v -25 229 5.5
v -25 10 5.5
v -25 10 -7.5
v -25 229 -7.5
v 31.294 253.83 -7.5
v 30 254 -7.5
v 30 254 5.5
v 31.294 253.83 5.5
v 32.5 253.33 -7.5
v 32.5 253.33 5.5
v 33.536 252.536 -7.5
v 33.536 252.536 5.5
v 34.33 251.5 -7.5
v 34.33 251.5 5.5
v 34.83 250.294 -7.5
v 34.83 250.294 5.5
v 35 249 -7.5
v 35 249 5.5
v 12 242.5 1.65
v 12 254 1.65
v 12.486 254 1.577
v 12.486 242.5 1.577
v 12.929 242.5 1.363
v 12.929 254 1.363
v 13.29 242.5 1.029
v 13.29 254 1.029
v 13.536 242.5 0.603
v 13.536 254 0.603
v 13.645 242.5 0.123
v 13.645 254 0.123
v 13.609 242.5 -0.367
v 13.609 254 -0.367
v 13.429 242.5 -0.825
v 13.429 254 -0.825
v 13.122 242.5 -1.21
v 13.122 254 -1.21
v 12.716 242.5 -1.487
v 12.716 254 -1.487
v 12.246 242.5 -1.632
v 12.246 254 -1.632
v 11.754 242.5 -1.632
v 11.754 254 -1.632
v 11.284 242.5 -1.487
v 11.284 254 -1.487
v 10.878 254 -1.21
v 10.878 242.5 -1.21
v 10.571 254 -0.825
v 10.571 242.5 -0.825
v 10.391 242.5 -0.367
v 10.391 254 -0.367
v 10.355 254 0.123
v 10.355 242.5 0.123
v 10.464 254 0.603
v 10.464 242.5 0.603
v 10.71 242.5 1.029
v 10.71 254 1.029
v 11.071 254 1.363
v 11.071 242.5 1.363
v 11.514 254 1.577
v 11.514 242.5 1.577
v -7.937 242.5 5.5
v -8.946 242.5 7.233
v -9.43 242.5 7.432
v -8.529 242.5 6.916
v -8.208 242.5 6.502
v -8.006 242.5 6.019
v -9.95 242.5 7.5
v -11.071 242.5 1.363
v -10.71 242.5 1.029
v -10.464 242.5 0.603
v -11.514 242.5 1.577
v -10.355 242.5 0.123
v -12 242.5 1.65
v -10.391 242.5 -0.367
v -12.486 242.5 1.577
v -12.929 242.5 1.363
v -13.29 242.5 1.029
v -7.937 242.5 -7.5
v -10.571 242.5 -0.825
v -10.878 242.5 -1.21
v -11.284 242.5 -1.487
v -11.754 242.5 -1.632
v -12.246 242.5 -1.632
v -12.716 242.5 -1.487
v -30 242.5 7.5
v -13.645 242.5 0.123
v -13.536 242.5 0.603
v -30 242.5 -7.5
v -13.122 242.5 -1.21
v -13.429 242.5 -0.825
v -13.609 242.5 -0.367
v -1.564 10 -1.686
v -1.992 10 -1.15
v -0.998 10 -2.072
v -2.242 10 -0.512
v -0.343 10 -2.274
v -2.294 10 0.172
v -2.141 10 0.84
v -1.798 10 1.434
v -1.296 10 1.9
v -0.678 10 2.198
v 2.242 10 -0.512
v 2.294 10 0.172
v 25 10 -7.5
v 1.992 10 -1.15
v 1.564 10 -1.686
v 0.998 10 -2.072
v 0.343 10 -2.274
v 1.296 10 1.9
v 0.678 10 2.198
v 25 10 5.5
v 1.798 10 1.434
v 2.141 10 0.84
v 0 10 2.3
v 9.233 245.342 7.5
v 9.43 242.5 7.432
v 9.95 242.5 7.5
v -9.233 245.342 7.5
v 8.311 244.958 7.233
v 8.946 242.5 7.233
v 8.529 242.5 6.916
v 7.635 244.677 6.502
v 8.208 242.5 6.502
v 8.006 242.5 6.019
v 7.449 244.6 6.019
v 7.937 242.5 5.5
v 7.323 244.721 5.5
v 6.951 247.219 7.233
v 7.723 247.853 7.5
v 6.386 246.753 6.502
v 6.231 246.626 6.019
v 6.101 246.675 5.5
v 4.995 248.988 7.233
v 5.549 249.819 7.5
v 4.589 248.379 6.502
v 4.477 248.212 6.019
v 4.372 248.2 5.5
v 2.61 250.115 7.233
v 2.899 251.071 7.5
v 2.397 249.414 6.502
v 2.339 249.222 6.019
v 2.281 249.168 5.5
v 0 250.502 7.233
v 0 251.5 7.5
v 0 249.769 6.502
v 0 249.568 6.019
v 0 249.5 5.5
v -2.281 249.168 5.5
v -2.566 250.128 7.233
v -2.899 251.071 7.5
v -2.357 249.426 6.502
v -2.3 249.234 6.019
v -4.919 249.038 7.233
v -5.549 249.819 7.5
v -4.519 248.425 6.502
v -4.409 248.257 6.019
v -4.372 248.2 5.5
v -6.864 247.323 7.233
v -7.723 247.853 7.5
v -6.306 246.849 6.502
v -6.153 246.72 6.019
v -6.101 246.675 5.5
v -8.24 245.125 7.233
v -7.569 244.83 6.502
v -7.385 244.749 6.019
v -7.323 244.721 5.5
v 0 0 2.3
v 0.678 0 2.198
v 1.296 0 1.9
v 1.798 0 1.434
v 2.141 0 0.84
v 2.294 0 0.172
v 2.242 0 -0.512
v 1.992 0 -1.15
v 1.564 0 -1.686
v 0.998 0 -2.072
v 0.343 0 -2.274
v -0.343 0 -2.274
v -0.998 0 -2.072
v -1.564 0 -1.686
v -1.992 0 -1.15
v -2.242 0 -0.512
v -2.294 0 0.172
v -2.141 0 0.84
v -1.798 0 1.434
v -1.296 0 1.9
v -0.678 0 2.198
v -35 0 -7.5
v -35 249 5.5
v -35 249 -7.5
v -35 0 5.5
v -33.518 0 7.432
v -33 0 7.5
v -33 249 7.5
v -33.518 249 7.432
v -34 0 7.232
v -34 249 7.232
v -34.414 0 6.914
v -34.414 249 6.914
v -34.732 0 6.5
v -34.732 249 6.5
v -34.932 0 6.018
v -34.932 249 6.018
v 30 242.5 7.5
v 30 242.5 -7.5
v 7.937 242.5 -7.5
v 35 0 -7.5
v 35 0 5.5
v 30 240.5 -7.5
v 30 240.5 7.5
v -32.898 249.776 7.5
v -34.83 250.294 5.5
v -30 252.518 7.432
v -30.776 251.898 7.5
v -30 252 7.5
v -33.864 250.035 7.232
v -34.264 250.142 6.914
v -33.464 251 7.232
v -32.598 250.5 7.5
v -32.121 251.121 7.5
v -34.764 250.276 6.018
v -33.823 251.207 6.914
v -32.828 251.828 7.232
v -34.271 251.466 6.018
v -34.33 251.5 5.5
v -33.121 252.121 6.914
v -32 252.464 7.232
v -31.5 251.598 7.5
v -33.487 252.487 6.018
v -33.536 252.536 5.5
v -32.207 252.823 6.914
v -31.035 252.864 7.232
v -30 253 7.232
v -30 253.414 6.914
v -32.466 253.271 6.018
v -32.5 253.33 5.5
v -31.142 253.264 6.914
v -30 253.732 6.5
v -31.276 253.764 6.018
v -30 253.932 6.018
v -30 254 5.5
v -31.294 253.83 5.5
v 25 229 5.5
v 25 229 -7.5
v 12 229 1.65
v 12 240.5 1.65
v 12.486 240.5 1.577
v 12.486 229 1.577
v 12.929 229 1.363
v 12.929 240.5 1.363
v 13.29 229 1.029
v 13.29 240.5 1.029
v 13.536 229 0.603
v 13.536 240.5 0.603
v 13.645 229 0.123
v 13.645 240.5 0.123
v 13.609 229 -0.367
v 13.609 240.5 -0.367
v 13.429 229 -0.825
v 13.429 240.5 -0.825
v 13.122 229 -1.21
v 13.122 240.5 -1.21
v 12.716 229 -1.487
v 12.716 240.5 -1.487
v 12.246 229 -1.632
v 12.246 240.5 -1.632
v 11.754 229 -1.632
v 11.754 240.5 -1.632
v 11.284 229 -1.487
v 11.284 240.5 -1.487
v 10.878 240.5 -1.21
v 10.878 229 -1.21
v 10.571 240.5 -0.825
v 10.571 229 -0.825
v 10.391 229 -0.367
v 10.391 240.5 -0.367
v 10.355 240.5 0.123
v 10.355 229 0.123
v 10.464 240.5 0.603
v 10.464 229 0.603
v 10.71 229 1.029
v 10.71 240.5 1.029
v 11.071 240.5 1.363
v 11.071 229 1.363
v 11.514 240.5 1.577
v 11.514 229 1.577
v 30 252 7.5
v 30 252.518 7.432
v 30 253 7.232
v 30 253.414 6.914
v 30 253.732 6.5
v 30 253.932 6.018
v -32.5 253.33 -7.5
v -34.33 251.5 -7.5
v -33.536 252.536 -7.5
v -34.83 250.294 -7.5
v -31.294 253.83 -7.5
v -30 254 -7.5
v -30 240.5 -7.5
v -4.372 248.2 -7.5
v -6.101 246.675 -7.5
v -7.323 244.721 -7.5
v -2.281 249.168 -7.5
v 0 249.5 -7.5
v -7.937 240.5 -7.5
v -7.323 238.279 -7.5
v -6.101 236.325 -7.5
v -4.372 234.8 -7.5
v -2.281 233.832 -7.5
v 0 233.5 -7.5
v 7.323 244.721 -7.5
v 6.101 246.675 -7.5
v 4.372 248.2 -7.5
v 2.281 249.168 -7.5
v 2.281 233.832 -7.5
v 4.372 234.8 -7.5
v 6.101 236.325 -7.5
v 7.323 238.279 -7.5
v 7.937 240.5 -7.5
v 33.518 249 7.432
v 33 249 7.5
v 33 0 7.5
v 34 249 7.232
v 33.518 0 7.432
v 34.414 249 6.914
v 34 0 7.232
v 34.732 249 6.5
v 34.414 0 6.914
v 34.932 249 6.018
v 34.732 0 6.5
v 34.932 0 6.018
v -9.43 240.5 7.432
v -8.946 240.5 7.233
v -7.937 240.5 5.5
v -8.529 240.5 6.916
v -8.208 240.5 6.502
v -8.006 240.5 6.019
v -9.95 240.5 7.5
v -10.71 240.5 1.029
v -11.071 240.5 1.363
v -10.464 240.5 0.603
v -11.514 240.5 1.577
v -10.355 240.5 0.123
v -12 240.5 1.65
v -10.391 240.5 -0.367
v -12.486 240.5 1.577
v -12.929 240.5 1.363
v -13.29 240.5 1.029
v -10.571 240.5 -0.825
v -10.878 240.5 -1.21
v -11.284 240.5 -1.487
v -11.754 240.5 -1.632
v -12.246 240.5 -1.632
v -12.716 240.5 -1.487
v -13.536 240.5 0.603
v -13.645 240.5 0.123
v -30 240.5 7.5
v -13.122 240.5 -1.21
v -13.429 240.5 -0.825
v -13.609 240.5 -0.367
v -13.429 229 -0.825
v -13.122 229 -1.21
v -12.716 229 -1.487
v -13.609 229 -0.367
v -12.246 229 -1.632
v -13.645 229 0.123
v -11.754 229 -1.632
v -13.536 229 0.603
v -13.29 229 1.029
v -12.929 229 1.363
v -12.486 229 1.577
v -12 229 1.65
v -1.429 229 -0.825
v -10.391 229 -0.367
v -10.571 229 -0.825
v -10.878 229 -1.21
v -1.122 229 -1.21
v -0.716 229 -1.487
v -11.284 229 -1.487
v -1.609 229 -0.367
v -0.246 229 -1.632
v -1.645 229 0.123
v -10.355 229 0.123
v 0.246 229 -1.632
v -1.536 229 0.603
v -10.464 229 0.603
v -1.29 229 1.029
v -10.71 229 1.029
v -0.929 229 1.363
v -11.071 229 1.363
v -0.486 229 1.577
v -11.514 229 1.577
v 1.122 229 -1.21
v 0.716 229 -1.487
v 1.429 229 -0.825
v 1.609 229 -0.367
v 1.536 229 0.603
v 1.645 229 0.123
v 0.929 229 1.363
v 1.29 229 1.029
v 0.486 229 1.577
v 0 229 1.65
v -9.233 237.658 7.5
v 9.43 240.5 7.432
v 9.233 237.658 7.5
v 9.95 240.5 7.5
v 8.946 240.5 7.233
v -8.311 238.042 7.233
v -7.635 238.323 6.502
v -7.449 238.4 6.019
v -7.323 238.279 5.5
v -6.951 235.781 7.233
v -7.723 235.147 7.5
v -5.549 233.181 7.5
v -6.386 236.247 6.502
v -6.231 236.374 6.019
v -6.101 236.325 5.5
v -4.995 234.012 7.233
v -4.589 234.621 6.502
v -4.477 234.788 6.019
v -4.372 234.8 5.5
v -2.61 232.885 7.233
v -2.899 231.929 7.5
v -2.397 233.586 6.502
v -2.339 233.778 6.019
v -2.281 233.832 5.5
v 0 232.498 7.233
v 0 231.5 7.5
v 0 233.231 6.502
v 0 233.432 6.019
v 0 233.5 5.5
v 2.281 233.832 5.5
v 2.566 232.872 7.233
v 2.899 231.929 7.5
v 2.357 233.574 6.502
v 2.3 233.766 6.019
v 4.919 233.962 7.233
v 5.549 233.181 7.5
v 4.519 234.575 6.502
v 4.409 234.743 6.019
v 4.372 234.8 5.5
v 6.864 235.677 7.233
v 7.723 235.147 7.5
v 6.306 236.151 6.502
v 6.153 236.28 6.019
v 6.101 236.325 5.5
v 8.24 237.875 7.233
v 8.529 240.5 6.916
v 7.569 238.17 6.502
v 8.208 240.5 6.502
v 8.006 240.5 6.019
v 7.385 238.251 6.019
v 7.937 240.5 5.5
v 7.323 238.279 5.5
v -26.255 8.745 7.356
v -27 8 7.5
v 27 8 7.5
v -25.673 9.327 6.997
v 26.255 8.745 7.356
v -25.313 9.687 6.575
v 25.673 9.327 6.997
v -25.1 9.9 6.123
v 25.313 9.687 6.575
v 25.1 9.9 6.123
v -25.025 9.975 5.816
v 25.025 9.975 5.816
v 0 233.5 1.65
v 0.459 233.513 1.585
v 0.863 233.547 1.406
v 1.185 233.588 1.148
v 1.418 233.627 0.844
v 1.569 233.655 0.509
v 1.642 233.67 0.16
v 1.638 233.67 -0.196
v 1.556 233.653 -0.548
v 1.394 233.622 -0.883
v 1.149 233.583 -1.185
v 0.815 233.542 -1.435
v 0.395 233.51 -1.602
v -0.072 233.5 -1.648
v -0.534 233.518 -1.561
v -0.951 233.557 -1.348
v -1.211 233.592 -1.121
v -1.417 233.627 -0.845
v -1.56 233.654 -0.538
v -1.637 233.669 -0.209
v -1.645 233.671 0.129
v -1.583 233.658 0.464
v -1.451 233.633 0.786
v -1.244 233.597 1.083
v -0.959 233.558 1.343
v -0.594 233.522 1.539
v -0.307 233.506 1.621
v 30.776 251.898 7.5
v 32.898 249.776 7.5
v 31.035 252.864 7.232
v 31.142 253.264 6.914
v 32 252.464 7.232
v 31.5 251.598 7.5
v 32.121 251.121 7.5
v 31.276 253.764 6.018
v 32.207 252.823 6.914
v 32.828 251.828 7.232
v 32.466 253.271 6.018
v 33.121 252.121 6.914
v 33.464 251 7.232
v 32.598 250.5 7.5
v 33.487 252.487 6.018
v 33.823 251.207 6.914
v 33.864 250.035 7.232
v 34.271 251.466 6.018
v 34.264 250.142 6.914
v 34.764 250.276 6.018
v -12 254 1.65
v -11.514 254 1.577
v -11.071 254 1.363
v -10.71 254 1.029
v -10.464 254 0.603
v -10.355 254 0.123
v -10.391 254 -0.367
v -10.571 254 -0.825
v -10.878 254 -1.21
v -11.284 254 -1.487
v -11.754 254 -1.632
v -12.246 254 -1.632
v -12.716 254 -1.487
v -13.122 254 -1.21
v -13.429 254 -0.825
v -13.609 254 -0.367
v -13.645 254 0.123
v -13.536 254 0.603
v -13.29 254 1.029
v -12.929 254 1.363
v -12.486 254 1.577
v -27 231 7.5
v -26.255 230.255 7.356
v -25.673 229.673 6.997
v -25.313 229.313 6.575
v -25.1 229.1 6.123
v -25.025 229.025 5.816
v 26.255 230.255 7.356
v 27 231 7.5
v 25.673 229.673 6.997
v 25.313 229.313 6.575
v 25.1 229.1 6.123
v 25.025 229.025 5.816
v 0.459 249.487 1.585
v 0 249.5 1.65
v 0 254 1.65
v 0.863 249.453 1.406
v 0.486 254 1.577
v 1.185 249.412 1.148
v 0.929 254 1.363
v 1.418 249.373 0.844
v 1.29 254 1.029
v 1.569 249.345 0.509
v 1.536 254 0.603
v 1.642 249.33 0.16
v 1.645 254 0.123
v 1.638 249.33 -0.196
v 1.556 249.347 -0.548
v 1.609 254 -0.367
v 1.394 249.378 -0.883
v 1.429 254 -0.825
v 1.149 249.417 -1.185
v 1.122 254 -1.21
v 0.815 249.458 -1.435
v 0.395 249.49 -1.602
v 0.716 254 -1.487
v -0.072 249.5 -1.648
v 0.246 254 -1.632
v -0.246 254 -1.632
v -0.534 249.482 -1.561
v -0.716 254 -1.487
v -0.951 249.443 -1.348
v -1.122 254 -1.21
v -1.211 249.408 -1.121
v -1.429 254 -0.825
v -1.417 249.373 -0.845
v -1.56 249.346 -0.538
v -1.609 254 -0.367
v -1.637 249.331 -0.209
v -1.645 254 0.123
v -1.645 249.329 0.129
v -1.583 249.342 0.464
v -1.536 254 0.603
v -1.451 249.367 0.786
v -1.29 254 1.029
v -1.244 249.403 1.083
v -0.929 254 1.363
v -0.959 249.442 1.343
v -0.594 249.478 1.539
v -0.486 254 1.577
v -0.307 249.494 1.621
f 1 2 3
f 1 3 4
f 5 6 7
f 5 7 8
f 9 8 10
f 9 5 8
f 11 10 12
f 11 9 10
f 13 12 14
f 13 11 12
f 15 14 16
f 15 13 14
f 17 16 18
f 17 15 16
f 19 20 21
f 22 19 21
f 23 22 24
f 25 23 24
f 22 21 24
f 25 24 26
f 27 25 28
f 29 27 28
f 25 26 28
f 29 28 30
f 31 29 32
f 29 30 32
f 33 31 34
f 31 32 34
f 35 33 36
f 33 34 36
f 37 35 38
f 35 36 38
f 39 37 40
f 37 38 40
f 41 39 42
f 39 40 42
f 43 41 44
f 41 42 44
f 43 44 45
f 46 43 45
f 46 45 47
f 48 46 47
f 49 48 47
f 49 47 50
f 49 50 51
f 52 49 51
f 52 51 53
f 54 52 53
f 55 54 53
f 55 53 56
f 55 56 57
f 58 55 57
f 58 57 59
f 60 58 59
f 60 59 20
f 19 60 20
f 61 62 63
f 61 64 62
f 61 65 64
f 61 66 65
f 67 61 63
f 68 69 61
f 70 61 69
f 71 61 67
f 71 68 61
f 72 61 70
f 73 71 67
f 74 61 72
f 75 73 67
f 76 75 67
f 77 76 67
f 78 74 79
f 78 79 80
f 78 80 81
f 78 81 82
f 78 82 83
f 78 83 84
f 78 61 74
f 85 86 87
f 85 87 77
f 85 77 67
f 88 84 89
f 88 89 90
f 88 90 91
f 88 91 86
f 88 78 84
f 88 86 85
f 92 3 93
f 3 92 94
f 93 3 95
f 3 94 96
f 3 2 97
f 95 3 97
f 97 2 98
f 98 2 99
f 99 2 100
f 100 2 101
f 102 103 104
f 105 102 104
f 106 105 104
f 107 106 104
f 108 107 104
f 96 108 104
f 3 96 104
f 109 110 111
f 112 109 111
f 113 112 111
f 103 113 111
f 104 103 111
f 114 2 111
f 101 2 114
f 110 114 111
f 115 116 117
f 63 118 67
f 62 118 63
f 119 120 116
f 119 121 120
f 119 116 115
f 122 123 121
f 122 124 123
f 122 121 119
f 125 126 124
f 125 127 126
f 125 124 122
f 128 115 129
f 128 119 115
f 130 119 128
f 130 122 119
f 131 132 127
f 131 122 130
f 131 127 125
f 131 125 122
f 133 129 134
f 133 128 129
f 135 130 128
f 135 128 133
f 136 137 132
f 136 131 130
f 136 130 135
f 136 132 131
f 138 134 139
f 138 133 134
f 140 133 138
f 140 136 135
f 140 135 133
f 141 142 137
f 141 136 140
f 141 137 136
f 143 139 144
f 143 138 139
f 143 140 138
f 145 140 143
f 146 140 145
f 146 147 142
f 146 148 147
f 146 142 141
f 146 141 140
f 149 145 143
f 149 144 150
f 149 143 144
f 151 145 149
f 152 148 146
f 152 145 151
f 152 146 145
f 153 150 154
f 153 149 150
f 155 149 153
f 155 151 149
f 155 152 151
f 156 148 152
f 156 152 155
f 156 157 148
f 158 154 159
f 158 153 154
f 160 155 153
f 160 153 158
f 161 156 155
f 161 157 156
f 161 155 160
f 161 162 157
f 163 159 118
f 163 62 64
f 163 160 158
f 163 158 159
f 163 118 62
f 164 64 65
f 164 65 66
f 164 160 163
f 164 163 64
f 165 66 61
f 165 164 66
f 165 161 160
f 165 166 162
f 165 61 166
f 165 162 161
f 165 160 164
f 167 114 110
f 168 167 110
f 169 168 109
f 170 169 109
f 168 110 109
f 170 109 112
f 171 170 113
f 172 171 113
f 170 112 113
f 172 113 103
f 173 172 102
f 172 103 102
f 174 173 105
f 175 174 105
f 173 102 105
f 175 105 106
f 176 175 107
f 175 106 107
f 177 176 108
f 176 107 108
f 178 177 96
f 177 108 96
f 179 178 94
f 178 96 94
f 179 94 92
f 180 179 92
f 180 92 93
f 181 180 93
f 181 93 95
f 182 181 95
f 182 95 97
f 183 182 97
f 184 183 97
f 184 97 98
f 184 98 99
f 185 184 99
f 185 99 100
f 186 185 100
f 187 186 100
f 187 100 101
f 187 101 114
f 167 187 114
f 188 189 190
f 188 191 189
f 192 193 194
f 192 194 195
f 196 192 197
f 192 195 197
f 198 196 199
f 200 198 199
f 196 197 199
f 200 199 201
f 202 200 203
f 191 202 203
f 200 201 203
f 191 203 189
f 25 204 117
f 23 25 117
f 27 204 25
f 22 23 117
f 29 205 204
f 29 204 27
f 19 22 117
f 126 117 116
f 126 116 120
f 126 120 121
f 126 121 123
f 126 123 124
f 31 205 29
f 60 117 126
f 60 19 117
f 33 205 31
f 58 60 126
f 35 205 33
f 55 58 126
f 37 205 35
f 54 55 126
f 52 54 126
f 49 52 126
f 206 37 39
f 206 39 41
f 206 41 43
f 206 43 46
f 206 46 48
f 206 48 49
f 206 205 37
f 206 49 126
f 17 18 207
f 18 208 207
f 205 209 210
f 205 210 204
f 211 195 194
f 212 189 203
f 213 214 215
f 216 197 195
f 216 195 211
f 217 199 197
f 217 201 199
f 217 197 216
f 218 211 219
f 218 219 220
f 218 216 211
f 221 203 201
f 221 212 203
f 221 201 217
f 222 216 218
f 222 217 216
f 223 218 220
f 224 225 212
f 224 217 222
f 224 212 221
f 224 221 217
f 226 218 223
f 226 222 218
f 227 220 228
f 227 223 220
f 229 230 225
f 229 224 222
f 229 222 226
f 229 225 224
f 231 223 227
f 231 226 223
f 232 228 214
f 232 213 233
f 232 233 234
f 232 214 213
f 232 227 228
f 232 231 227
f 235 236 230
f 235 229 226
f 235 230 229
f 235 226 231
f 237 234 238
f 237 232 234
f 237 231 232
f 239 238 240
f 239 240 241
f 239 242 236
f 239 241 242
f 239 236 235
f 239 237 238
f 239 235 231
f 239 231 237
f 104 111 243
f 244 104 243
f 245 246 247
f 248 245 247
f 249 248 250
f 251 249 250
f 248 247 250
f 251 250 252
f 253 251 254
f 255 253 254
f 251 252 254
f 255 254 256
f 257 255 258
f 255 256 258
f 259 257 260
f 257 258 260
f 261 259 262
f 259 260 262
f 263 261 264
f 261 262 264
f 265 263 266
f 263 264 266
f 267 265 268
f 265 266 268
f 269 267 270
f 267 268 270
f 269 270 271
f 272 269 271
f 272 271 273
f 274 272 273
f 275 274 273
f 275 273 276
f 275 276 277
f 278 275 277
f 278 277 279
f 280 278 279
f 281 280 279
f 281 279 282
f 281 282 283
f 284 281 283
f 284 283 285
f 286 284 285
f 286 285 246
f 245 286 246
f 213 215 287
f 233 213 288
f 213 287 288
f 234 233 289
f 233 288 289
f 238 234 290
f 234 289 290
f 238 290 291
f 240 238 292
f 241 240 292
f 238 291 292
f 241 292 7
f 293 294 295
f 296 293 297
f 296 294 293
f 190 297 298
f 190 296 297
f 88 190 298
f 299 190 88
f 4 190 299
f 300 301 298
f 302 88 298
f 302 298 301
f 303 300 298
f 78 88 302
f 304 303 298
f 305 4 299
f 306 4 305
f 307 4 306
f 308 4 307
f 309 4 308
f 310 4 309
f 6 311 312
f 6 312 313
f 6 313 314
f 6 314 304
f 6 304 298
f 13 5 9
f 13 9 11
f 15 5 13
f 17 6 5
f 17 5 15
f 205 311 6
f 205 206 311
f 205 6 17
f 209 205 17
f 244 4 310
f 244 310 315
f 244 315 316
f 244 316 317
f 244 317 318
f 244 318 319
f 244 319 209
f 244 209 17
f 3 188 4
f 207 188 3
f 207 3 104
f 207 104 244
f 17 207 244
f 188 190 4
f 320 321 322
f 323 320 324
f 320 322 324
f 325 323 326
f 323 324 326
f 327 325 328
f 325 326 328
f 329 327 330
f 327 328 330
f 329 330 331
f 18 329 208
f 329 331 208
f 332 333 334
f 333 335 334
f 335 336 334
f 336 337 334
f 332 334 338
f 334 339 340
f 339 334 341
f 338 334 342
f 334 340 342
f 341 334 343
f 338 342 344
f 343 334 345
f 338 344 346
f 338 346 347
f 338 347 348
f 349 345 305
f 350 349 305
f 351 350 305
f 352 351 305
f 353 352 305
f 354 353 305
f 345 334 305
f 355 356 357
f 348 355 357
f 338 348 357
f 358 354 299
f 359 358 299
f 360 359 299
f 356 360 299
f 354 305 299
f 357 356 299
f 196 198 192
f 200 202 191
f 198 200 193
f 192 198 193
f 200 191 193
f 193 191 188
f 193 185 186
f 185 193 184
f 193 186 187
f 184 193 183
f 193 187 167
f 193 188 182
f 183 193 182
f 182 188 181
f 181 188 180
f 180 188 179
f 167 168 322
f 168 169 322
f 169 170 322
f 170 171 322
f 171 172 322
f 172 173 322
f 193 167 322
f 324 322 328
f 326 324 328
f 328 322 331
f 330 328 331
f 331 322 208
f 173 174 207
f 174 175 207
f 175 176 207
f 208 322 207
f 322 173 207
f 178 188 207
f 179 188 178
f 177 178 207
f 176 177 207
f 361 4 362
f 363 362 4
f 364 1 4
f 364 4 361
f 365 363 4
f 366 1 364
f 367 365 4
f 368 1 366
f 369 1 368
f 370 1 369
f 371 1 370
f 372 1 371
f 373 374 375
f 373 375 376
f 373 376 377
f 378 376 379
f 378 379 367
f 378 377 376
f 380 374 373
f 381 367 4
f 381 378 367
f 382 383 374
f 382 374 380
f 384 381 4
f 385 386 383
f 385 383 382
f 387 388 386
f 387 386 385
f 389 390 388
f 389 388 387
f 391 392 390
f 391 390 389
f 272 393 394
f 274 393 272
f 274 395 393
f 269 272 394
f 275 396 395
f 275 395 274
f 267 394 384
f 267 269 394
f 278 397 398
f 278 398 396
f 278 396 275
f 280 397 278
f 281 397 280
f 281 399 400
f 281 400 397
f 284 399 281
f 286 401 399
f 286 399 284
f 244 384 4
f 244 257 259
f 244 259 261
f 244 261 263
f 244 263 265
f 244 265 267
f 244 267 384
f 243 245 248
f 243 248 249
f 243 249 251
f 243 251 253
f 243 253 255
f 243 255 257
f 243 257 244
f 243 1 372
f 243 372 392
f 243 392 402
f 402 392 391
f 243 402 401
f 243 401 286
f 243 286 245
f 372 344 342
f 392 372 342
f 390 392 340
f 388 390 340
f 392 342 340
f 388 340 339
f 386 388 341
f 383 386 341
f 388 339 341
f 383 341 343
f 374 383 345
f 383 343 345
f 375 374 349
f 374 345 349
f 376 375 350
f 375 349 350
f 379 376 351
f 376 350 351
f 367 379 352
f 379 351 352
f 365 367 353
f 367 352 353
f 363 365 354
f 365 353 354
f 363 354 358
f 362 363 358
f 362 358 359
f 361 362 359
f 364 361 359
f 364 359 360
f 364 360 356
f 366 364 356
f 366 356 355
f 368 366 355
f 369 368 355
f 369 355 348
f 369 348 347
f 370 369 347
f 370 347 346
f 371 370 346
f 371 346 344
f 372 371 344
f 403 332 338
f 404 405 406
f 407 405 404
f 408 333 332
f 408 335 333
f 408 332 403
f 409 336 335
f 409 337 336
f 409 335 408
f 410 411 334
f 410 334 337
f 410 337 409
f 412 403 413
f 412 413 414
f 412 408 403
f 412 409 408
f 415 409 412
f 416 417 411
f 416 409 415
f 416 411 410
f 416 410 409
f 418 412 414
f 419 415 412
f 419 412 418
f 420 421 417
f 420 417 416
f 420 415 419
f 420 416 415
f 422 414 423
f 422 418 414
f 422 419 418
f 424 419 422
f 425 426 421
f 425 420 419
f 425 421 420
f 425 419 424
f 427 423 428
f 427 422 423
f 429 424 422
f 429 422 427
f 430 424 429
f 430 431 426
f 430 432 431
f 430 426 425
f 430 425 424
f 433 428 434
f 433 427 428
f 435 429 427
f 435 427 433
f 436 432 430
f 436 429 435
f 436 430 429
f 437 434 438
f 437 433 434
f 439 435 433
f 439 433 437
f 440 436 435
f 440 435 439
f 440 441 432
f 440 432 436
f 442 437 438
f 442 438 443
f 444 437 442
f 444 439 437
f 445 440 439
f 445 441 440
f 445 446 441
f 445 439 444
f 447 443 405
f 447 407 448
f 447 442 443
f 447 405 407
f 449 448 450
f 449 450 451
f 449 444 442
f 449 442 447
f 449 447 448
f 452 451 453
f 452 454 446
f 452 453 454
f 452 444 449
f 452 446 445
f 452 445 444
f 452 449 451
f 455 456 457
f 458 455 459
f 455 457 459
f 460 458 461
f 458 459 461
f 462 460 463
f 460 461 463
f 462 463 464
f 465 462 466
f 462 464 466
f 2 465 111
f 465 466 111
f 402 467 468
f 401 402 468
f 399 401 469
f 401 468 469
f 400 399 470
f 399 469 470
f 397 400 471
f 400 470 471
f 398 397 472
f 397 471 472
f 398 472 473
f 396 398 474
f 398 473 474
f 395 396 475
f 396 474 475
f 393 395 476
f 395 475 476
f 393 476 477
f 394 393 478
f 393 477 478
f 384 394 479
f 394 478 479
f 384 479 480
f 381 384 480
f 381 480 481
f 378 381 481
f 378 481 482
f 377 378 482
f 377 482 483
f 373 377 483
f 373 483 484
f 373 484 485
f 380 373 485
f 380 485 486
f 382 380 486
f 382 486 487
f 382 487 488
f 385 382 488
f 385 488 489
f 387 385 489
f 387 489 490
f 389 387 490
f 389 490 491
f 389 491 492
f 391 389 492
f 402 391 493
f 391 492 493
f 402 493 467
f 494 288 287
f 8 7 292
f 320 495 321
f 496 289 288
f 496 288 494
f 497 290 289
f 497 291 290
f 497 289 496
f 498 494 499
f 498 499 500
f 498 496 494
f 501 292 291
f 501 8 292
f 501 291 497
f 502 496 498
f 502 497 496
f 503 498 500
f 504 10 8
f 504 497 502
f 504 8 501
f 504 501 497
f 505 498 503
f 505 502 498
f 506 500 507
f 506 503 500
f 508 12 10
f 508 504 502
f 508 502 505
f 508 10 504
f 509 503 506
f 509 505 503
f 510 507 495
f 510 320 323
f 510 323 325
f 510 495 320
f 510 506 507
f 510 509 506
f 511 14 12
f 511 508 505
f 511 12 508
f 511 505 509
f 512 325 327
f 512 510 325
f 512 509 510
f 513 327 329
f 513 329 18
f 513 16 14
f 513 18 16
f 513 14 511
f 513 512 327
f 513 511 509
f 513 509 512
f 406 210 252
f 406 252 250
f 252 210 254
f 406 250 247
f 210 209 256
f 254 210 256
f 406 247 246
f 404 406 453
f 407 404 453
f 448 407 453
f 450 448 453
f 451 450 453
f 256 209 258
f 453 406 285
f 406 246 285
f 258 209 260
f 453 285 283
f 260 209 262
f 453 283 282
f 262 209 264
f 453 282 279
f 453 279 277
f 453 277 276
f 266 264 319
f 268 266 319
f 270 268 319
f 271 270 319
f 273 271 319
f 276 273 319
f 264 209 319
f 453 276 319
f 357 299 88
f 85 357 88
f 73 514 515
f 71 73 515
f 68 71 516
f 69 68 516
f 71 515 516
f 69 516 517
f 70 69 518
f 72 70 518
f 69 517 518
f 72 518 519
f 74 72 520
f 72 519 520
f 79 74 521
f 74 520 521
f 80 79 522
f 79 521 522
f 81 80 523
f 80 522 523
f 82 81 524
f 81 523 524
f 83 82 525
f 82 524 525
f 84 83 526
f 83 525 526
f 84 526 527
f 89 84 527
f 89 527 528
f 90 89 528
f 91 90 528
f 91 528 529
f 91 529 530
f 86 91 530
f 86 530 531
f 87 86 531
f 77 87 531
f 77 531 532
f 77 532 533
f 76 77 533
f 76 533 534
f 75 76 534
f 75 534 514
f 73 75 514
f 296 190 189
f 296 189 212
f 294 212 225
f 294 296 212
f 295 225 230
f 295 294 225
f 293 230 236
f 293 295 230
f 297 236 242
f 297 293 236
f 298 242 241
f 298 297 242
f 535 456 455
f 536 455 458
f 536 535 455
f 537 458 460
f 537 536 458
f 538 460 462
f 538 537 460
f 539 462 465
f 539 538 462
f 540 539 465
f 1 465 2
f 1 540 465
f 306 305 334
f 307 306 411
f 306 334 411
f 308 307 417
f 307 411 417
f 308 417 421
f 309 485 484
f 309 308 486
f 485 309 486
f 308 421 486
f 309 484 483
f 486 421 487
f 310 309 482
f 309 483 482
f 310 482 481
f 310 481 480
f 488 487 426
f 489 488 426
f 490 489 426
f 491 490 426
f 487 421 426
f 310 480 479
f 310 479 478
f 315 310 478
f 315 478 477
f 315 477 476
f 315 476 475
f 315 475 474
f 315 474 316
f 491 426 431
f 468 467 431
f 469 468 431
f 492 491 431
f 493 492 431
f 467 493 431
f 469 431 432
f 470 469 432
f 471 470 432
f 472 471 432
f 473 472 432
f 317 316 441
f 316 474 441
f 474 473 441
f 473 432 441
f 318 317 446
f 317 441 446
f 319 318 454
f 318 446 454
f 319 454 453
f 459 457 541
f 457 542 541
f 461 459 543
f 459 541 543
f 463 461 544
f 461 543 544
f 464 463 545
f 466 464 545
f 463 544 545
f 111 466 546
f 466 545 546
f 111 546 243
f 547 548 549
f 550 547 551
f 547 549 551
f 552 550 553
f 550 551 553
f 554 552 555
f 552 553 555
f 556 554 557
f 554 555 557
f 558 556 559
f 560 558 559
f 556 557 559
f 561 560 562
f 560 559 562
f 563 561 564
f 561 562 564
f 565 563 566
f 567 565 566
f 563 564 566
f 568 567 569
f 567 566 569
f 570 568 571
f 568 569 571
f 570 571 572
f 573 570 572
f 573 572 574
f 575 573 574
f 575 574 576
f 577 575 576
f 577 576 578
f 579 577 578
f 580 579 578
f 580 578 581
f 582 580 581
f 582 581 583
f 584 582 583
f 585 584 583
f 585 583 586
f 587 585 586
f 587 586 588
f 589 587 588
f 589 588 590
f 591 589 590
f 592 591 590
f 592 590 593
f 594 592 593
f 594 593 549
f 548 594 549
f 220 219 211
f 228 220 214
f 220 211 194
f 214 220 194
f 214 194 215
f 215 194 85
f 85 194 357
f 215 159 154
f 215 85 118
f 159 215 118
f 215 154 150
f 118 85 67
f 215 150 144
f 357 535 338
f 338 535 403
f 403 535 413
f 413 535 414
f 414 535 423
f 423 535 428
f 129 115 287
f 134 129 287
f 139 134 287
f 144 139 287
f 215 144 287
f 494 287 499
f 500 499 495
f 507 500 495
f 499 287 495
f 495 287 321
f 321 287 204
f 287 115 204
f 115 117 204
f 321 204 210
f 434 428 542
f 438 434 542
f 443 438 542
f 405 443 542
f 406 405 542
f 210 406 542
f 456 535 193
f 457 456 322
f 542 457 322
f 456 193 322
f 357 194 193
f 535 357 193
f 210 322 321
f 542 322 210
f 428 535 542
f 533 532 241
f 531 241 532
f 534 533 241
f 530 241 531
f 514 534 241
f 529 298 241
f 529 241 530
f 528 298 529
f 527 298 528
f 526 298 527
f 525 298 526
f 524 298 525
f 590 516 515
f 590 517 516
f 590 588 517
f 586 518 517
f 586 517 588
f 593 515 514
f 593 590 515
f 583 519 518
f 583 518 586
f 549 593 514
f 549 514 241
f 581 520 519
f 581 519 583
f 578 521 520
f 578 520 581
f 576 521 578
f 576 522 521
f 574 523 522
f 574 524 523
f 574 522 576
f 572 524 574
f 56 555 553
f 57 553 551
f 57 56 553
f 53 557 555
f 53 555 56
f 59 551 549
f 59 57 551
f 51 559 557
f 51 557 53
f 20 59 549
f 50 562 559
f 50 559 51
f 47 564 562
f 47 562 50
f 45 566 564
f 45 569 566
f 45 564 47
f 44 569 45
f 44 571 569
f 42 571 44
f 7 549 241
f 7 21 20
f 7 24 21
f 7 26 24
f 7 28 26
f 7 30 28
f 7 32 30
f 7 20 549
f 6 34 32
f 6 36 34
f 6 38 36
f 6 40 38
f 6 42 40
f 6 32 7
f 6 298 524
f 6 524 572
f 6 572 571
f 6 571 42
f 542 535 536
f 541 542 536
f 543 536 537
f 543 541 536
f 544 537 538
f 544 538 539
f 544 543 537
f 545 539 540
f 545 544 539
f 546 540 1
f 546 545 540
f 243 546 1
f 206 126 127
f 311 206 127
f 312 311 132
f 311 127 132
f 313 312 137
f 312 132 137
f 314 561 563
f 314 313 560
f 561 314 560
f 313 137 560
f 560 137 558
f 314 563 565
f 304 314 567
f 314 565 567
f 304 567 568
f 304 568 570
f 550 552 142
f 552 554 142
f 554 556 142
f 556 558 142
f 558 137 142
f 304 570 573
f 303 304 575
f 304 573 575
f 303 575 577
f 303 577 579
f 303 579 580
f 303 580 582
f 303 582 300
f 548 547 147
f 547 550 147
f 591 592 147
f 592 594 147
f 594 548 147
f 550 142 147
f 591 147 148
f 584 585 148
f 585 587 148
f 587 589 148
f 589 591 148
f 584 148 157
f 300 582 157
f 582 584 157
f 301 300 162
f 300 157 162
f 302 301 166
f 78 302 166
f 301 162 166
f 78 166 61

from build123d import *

# Parameters (mm, degrees)
SKETCH_1_W          = 70
SKETCH_1_H          = 15
EXTRUDE_3_DEPTH     = 254
SKETCH_5_W          = 50
SKETCH_5_H          = 219
CUT_EXTRUDE_2_DEPTH = 150
SKETCH_6_R          = 8
CUT_EXTRUDE_3_DEPTH = 150
FILLET_1_R          = 2
FILLET_2_R          = 5
FILLET_3_R          = 5
SKETCH_7_R          = 2.3
CUT_EXTRUDE_4_DEPTH = 150
SKETCH_8_W          = 60
SKETCH_8_H          = 2
CUT_EXTRUDE_5_DEPTH = 257.838470639
FILLET_4_R          = 2
FILLET_7_R          = 2
SKETCH_9_R          = 1.65
CUT_EXTRUDE_6_DEPTH = 30


with BuildPart() as part:
    # 草图1 → 凸台-拉伸3 (new body)
    with BuildSketch(Plane(origin=(0, 0, 0), x_dir=(1, 0, 0), z_dir=(0, 1, 0))):
        Rectangle(SKETCH_1_W, SKETCH_1_H)
    extrude(amount=EXTRUDE_3_DEPTH)

    # 草图5 → 切除-拉伸2 (cut)
    with BuildSketch(Plane.XY.offset(7.5)):
        with Locations((0, 119.5)):
            Rectangle(SKETCH_5_W, SKETCH_5_H)
    extrude(amount=-CUT_EXTRUDE_2_DEPTH, mode=Mode.SUBTRACT)

    # 草图6 → 切除-拉伸3 (cut)
    with BuildSketch(Plane.XY.offset(7.5)):
        with Locations((0, 241.5)):
            Circle(SKETCH_6_R)
    extrude(amount=-CUT_EXTRUDE_3_DEPTH, mode=Mode.SUBTRACT)

    # 圆角1
    fillet_1_edges = [part.edges().sort_by_distance(p)[0] for p in [
        (-8, 241.5, 7.5),
    ]]
    fillet(fillet_1_edges, radius=FILLET_1_R)

    # 圆角2
    fillet_2_edges = [part.edges().sort_by_distance(p)[0] for p in [
        (-35, 254, 0),
    ]]
    fillet(fillet_2_edges, radius=FILLET_2_R)

    # 圆角3
    fillet_3_edges = [part.edges().sort_by_distance(p)[0] for p in [
        (35, 254, 0),
    ]]
    fillet(fillet_3_edges, radius=FILLET_3_R)

    # 草图7 → 切除-拉伸4 (cut)
    with BuildSketch(Plane(origin=(0, 10, 0), x_dir=(1, 0, 0), z_dir=(0, 1, 0))):
        with Locations(Location((0, 0, 0), (0, 0, 270))):
            Circle(SKETCH_7_R)
    extrude(amount=-CUT_EXTRUDE_4_DEPTH, mode=Mode.SUBTRACT)

    # 草图8 → 切除-拉伸5 (cut, through all)
    with BuildSketch(Plane(origin=(0, 0, -7.5), x_dir=(-1, 0, 0), z_dir=(0, 0, -1))):
        with Locations((0, 241.5)):
            Rectangle(SKETCH_8_W, SKETCH_8_H)
    extrude(amount=-CUT_EXTRUDE_5_DEPTH, mode=Mode.SUBTRACT)

    # 圆角4
    fillet_4_edges = [part.edges().sort_by_distance(p)[0] for p in [
        (-35, 124.5, 7.5),
        (0, 254, 7.5),
        (-33.535533906, 252.535533906, 7.5),
        (35, 124.5, 7.5),
        (33.535533906, 252.535533906, 7.5),
    ]]
    fillet(fillet_4_edges, radius=FILLET_4_R)

    # 圆角7
    fillet_7_edges = [part.edges().sort_by_distance(p)[0] for p in [
        (-25, 119.5, 7.5),
        (0, 10, 7.5),
        (25, 119.5, 7.5),
        (0, 229, 7.5),
    ]]
    fillet(fillet_7_edges, radius=FILLET_7_R)

    # 草图9 → 切除-拉伸6 (cut)
    with BuildSketch(Plane(origin=(0, 254, 0), x_dir=(1, 0, 0), z_dir=(0, 1, 0))):
        with Locations(Location((-12, 0, 0), (0, 0, 270))):
            Circle(SKETCH_9_R)
        with Locations(Location((12, 0, 0), (0, 0, 270))):
            Circle(SKETCH_9_R)
        with Locations(Location((0, 0, 0), (0, 0, 270))):
            Circle(SKETCH_9_R)
    extrude(amount=-CUT_EXTRUDE_6_DEPTH, mode=Mode.SUBTRACT)


solid = part.part
